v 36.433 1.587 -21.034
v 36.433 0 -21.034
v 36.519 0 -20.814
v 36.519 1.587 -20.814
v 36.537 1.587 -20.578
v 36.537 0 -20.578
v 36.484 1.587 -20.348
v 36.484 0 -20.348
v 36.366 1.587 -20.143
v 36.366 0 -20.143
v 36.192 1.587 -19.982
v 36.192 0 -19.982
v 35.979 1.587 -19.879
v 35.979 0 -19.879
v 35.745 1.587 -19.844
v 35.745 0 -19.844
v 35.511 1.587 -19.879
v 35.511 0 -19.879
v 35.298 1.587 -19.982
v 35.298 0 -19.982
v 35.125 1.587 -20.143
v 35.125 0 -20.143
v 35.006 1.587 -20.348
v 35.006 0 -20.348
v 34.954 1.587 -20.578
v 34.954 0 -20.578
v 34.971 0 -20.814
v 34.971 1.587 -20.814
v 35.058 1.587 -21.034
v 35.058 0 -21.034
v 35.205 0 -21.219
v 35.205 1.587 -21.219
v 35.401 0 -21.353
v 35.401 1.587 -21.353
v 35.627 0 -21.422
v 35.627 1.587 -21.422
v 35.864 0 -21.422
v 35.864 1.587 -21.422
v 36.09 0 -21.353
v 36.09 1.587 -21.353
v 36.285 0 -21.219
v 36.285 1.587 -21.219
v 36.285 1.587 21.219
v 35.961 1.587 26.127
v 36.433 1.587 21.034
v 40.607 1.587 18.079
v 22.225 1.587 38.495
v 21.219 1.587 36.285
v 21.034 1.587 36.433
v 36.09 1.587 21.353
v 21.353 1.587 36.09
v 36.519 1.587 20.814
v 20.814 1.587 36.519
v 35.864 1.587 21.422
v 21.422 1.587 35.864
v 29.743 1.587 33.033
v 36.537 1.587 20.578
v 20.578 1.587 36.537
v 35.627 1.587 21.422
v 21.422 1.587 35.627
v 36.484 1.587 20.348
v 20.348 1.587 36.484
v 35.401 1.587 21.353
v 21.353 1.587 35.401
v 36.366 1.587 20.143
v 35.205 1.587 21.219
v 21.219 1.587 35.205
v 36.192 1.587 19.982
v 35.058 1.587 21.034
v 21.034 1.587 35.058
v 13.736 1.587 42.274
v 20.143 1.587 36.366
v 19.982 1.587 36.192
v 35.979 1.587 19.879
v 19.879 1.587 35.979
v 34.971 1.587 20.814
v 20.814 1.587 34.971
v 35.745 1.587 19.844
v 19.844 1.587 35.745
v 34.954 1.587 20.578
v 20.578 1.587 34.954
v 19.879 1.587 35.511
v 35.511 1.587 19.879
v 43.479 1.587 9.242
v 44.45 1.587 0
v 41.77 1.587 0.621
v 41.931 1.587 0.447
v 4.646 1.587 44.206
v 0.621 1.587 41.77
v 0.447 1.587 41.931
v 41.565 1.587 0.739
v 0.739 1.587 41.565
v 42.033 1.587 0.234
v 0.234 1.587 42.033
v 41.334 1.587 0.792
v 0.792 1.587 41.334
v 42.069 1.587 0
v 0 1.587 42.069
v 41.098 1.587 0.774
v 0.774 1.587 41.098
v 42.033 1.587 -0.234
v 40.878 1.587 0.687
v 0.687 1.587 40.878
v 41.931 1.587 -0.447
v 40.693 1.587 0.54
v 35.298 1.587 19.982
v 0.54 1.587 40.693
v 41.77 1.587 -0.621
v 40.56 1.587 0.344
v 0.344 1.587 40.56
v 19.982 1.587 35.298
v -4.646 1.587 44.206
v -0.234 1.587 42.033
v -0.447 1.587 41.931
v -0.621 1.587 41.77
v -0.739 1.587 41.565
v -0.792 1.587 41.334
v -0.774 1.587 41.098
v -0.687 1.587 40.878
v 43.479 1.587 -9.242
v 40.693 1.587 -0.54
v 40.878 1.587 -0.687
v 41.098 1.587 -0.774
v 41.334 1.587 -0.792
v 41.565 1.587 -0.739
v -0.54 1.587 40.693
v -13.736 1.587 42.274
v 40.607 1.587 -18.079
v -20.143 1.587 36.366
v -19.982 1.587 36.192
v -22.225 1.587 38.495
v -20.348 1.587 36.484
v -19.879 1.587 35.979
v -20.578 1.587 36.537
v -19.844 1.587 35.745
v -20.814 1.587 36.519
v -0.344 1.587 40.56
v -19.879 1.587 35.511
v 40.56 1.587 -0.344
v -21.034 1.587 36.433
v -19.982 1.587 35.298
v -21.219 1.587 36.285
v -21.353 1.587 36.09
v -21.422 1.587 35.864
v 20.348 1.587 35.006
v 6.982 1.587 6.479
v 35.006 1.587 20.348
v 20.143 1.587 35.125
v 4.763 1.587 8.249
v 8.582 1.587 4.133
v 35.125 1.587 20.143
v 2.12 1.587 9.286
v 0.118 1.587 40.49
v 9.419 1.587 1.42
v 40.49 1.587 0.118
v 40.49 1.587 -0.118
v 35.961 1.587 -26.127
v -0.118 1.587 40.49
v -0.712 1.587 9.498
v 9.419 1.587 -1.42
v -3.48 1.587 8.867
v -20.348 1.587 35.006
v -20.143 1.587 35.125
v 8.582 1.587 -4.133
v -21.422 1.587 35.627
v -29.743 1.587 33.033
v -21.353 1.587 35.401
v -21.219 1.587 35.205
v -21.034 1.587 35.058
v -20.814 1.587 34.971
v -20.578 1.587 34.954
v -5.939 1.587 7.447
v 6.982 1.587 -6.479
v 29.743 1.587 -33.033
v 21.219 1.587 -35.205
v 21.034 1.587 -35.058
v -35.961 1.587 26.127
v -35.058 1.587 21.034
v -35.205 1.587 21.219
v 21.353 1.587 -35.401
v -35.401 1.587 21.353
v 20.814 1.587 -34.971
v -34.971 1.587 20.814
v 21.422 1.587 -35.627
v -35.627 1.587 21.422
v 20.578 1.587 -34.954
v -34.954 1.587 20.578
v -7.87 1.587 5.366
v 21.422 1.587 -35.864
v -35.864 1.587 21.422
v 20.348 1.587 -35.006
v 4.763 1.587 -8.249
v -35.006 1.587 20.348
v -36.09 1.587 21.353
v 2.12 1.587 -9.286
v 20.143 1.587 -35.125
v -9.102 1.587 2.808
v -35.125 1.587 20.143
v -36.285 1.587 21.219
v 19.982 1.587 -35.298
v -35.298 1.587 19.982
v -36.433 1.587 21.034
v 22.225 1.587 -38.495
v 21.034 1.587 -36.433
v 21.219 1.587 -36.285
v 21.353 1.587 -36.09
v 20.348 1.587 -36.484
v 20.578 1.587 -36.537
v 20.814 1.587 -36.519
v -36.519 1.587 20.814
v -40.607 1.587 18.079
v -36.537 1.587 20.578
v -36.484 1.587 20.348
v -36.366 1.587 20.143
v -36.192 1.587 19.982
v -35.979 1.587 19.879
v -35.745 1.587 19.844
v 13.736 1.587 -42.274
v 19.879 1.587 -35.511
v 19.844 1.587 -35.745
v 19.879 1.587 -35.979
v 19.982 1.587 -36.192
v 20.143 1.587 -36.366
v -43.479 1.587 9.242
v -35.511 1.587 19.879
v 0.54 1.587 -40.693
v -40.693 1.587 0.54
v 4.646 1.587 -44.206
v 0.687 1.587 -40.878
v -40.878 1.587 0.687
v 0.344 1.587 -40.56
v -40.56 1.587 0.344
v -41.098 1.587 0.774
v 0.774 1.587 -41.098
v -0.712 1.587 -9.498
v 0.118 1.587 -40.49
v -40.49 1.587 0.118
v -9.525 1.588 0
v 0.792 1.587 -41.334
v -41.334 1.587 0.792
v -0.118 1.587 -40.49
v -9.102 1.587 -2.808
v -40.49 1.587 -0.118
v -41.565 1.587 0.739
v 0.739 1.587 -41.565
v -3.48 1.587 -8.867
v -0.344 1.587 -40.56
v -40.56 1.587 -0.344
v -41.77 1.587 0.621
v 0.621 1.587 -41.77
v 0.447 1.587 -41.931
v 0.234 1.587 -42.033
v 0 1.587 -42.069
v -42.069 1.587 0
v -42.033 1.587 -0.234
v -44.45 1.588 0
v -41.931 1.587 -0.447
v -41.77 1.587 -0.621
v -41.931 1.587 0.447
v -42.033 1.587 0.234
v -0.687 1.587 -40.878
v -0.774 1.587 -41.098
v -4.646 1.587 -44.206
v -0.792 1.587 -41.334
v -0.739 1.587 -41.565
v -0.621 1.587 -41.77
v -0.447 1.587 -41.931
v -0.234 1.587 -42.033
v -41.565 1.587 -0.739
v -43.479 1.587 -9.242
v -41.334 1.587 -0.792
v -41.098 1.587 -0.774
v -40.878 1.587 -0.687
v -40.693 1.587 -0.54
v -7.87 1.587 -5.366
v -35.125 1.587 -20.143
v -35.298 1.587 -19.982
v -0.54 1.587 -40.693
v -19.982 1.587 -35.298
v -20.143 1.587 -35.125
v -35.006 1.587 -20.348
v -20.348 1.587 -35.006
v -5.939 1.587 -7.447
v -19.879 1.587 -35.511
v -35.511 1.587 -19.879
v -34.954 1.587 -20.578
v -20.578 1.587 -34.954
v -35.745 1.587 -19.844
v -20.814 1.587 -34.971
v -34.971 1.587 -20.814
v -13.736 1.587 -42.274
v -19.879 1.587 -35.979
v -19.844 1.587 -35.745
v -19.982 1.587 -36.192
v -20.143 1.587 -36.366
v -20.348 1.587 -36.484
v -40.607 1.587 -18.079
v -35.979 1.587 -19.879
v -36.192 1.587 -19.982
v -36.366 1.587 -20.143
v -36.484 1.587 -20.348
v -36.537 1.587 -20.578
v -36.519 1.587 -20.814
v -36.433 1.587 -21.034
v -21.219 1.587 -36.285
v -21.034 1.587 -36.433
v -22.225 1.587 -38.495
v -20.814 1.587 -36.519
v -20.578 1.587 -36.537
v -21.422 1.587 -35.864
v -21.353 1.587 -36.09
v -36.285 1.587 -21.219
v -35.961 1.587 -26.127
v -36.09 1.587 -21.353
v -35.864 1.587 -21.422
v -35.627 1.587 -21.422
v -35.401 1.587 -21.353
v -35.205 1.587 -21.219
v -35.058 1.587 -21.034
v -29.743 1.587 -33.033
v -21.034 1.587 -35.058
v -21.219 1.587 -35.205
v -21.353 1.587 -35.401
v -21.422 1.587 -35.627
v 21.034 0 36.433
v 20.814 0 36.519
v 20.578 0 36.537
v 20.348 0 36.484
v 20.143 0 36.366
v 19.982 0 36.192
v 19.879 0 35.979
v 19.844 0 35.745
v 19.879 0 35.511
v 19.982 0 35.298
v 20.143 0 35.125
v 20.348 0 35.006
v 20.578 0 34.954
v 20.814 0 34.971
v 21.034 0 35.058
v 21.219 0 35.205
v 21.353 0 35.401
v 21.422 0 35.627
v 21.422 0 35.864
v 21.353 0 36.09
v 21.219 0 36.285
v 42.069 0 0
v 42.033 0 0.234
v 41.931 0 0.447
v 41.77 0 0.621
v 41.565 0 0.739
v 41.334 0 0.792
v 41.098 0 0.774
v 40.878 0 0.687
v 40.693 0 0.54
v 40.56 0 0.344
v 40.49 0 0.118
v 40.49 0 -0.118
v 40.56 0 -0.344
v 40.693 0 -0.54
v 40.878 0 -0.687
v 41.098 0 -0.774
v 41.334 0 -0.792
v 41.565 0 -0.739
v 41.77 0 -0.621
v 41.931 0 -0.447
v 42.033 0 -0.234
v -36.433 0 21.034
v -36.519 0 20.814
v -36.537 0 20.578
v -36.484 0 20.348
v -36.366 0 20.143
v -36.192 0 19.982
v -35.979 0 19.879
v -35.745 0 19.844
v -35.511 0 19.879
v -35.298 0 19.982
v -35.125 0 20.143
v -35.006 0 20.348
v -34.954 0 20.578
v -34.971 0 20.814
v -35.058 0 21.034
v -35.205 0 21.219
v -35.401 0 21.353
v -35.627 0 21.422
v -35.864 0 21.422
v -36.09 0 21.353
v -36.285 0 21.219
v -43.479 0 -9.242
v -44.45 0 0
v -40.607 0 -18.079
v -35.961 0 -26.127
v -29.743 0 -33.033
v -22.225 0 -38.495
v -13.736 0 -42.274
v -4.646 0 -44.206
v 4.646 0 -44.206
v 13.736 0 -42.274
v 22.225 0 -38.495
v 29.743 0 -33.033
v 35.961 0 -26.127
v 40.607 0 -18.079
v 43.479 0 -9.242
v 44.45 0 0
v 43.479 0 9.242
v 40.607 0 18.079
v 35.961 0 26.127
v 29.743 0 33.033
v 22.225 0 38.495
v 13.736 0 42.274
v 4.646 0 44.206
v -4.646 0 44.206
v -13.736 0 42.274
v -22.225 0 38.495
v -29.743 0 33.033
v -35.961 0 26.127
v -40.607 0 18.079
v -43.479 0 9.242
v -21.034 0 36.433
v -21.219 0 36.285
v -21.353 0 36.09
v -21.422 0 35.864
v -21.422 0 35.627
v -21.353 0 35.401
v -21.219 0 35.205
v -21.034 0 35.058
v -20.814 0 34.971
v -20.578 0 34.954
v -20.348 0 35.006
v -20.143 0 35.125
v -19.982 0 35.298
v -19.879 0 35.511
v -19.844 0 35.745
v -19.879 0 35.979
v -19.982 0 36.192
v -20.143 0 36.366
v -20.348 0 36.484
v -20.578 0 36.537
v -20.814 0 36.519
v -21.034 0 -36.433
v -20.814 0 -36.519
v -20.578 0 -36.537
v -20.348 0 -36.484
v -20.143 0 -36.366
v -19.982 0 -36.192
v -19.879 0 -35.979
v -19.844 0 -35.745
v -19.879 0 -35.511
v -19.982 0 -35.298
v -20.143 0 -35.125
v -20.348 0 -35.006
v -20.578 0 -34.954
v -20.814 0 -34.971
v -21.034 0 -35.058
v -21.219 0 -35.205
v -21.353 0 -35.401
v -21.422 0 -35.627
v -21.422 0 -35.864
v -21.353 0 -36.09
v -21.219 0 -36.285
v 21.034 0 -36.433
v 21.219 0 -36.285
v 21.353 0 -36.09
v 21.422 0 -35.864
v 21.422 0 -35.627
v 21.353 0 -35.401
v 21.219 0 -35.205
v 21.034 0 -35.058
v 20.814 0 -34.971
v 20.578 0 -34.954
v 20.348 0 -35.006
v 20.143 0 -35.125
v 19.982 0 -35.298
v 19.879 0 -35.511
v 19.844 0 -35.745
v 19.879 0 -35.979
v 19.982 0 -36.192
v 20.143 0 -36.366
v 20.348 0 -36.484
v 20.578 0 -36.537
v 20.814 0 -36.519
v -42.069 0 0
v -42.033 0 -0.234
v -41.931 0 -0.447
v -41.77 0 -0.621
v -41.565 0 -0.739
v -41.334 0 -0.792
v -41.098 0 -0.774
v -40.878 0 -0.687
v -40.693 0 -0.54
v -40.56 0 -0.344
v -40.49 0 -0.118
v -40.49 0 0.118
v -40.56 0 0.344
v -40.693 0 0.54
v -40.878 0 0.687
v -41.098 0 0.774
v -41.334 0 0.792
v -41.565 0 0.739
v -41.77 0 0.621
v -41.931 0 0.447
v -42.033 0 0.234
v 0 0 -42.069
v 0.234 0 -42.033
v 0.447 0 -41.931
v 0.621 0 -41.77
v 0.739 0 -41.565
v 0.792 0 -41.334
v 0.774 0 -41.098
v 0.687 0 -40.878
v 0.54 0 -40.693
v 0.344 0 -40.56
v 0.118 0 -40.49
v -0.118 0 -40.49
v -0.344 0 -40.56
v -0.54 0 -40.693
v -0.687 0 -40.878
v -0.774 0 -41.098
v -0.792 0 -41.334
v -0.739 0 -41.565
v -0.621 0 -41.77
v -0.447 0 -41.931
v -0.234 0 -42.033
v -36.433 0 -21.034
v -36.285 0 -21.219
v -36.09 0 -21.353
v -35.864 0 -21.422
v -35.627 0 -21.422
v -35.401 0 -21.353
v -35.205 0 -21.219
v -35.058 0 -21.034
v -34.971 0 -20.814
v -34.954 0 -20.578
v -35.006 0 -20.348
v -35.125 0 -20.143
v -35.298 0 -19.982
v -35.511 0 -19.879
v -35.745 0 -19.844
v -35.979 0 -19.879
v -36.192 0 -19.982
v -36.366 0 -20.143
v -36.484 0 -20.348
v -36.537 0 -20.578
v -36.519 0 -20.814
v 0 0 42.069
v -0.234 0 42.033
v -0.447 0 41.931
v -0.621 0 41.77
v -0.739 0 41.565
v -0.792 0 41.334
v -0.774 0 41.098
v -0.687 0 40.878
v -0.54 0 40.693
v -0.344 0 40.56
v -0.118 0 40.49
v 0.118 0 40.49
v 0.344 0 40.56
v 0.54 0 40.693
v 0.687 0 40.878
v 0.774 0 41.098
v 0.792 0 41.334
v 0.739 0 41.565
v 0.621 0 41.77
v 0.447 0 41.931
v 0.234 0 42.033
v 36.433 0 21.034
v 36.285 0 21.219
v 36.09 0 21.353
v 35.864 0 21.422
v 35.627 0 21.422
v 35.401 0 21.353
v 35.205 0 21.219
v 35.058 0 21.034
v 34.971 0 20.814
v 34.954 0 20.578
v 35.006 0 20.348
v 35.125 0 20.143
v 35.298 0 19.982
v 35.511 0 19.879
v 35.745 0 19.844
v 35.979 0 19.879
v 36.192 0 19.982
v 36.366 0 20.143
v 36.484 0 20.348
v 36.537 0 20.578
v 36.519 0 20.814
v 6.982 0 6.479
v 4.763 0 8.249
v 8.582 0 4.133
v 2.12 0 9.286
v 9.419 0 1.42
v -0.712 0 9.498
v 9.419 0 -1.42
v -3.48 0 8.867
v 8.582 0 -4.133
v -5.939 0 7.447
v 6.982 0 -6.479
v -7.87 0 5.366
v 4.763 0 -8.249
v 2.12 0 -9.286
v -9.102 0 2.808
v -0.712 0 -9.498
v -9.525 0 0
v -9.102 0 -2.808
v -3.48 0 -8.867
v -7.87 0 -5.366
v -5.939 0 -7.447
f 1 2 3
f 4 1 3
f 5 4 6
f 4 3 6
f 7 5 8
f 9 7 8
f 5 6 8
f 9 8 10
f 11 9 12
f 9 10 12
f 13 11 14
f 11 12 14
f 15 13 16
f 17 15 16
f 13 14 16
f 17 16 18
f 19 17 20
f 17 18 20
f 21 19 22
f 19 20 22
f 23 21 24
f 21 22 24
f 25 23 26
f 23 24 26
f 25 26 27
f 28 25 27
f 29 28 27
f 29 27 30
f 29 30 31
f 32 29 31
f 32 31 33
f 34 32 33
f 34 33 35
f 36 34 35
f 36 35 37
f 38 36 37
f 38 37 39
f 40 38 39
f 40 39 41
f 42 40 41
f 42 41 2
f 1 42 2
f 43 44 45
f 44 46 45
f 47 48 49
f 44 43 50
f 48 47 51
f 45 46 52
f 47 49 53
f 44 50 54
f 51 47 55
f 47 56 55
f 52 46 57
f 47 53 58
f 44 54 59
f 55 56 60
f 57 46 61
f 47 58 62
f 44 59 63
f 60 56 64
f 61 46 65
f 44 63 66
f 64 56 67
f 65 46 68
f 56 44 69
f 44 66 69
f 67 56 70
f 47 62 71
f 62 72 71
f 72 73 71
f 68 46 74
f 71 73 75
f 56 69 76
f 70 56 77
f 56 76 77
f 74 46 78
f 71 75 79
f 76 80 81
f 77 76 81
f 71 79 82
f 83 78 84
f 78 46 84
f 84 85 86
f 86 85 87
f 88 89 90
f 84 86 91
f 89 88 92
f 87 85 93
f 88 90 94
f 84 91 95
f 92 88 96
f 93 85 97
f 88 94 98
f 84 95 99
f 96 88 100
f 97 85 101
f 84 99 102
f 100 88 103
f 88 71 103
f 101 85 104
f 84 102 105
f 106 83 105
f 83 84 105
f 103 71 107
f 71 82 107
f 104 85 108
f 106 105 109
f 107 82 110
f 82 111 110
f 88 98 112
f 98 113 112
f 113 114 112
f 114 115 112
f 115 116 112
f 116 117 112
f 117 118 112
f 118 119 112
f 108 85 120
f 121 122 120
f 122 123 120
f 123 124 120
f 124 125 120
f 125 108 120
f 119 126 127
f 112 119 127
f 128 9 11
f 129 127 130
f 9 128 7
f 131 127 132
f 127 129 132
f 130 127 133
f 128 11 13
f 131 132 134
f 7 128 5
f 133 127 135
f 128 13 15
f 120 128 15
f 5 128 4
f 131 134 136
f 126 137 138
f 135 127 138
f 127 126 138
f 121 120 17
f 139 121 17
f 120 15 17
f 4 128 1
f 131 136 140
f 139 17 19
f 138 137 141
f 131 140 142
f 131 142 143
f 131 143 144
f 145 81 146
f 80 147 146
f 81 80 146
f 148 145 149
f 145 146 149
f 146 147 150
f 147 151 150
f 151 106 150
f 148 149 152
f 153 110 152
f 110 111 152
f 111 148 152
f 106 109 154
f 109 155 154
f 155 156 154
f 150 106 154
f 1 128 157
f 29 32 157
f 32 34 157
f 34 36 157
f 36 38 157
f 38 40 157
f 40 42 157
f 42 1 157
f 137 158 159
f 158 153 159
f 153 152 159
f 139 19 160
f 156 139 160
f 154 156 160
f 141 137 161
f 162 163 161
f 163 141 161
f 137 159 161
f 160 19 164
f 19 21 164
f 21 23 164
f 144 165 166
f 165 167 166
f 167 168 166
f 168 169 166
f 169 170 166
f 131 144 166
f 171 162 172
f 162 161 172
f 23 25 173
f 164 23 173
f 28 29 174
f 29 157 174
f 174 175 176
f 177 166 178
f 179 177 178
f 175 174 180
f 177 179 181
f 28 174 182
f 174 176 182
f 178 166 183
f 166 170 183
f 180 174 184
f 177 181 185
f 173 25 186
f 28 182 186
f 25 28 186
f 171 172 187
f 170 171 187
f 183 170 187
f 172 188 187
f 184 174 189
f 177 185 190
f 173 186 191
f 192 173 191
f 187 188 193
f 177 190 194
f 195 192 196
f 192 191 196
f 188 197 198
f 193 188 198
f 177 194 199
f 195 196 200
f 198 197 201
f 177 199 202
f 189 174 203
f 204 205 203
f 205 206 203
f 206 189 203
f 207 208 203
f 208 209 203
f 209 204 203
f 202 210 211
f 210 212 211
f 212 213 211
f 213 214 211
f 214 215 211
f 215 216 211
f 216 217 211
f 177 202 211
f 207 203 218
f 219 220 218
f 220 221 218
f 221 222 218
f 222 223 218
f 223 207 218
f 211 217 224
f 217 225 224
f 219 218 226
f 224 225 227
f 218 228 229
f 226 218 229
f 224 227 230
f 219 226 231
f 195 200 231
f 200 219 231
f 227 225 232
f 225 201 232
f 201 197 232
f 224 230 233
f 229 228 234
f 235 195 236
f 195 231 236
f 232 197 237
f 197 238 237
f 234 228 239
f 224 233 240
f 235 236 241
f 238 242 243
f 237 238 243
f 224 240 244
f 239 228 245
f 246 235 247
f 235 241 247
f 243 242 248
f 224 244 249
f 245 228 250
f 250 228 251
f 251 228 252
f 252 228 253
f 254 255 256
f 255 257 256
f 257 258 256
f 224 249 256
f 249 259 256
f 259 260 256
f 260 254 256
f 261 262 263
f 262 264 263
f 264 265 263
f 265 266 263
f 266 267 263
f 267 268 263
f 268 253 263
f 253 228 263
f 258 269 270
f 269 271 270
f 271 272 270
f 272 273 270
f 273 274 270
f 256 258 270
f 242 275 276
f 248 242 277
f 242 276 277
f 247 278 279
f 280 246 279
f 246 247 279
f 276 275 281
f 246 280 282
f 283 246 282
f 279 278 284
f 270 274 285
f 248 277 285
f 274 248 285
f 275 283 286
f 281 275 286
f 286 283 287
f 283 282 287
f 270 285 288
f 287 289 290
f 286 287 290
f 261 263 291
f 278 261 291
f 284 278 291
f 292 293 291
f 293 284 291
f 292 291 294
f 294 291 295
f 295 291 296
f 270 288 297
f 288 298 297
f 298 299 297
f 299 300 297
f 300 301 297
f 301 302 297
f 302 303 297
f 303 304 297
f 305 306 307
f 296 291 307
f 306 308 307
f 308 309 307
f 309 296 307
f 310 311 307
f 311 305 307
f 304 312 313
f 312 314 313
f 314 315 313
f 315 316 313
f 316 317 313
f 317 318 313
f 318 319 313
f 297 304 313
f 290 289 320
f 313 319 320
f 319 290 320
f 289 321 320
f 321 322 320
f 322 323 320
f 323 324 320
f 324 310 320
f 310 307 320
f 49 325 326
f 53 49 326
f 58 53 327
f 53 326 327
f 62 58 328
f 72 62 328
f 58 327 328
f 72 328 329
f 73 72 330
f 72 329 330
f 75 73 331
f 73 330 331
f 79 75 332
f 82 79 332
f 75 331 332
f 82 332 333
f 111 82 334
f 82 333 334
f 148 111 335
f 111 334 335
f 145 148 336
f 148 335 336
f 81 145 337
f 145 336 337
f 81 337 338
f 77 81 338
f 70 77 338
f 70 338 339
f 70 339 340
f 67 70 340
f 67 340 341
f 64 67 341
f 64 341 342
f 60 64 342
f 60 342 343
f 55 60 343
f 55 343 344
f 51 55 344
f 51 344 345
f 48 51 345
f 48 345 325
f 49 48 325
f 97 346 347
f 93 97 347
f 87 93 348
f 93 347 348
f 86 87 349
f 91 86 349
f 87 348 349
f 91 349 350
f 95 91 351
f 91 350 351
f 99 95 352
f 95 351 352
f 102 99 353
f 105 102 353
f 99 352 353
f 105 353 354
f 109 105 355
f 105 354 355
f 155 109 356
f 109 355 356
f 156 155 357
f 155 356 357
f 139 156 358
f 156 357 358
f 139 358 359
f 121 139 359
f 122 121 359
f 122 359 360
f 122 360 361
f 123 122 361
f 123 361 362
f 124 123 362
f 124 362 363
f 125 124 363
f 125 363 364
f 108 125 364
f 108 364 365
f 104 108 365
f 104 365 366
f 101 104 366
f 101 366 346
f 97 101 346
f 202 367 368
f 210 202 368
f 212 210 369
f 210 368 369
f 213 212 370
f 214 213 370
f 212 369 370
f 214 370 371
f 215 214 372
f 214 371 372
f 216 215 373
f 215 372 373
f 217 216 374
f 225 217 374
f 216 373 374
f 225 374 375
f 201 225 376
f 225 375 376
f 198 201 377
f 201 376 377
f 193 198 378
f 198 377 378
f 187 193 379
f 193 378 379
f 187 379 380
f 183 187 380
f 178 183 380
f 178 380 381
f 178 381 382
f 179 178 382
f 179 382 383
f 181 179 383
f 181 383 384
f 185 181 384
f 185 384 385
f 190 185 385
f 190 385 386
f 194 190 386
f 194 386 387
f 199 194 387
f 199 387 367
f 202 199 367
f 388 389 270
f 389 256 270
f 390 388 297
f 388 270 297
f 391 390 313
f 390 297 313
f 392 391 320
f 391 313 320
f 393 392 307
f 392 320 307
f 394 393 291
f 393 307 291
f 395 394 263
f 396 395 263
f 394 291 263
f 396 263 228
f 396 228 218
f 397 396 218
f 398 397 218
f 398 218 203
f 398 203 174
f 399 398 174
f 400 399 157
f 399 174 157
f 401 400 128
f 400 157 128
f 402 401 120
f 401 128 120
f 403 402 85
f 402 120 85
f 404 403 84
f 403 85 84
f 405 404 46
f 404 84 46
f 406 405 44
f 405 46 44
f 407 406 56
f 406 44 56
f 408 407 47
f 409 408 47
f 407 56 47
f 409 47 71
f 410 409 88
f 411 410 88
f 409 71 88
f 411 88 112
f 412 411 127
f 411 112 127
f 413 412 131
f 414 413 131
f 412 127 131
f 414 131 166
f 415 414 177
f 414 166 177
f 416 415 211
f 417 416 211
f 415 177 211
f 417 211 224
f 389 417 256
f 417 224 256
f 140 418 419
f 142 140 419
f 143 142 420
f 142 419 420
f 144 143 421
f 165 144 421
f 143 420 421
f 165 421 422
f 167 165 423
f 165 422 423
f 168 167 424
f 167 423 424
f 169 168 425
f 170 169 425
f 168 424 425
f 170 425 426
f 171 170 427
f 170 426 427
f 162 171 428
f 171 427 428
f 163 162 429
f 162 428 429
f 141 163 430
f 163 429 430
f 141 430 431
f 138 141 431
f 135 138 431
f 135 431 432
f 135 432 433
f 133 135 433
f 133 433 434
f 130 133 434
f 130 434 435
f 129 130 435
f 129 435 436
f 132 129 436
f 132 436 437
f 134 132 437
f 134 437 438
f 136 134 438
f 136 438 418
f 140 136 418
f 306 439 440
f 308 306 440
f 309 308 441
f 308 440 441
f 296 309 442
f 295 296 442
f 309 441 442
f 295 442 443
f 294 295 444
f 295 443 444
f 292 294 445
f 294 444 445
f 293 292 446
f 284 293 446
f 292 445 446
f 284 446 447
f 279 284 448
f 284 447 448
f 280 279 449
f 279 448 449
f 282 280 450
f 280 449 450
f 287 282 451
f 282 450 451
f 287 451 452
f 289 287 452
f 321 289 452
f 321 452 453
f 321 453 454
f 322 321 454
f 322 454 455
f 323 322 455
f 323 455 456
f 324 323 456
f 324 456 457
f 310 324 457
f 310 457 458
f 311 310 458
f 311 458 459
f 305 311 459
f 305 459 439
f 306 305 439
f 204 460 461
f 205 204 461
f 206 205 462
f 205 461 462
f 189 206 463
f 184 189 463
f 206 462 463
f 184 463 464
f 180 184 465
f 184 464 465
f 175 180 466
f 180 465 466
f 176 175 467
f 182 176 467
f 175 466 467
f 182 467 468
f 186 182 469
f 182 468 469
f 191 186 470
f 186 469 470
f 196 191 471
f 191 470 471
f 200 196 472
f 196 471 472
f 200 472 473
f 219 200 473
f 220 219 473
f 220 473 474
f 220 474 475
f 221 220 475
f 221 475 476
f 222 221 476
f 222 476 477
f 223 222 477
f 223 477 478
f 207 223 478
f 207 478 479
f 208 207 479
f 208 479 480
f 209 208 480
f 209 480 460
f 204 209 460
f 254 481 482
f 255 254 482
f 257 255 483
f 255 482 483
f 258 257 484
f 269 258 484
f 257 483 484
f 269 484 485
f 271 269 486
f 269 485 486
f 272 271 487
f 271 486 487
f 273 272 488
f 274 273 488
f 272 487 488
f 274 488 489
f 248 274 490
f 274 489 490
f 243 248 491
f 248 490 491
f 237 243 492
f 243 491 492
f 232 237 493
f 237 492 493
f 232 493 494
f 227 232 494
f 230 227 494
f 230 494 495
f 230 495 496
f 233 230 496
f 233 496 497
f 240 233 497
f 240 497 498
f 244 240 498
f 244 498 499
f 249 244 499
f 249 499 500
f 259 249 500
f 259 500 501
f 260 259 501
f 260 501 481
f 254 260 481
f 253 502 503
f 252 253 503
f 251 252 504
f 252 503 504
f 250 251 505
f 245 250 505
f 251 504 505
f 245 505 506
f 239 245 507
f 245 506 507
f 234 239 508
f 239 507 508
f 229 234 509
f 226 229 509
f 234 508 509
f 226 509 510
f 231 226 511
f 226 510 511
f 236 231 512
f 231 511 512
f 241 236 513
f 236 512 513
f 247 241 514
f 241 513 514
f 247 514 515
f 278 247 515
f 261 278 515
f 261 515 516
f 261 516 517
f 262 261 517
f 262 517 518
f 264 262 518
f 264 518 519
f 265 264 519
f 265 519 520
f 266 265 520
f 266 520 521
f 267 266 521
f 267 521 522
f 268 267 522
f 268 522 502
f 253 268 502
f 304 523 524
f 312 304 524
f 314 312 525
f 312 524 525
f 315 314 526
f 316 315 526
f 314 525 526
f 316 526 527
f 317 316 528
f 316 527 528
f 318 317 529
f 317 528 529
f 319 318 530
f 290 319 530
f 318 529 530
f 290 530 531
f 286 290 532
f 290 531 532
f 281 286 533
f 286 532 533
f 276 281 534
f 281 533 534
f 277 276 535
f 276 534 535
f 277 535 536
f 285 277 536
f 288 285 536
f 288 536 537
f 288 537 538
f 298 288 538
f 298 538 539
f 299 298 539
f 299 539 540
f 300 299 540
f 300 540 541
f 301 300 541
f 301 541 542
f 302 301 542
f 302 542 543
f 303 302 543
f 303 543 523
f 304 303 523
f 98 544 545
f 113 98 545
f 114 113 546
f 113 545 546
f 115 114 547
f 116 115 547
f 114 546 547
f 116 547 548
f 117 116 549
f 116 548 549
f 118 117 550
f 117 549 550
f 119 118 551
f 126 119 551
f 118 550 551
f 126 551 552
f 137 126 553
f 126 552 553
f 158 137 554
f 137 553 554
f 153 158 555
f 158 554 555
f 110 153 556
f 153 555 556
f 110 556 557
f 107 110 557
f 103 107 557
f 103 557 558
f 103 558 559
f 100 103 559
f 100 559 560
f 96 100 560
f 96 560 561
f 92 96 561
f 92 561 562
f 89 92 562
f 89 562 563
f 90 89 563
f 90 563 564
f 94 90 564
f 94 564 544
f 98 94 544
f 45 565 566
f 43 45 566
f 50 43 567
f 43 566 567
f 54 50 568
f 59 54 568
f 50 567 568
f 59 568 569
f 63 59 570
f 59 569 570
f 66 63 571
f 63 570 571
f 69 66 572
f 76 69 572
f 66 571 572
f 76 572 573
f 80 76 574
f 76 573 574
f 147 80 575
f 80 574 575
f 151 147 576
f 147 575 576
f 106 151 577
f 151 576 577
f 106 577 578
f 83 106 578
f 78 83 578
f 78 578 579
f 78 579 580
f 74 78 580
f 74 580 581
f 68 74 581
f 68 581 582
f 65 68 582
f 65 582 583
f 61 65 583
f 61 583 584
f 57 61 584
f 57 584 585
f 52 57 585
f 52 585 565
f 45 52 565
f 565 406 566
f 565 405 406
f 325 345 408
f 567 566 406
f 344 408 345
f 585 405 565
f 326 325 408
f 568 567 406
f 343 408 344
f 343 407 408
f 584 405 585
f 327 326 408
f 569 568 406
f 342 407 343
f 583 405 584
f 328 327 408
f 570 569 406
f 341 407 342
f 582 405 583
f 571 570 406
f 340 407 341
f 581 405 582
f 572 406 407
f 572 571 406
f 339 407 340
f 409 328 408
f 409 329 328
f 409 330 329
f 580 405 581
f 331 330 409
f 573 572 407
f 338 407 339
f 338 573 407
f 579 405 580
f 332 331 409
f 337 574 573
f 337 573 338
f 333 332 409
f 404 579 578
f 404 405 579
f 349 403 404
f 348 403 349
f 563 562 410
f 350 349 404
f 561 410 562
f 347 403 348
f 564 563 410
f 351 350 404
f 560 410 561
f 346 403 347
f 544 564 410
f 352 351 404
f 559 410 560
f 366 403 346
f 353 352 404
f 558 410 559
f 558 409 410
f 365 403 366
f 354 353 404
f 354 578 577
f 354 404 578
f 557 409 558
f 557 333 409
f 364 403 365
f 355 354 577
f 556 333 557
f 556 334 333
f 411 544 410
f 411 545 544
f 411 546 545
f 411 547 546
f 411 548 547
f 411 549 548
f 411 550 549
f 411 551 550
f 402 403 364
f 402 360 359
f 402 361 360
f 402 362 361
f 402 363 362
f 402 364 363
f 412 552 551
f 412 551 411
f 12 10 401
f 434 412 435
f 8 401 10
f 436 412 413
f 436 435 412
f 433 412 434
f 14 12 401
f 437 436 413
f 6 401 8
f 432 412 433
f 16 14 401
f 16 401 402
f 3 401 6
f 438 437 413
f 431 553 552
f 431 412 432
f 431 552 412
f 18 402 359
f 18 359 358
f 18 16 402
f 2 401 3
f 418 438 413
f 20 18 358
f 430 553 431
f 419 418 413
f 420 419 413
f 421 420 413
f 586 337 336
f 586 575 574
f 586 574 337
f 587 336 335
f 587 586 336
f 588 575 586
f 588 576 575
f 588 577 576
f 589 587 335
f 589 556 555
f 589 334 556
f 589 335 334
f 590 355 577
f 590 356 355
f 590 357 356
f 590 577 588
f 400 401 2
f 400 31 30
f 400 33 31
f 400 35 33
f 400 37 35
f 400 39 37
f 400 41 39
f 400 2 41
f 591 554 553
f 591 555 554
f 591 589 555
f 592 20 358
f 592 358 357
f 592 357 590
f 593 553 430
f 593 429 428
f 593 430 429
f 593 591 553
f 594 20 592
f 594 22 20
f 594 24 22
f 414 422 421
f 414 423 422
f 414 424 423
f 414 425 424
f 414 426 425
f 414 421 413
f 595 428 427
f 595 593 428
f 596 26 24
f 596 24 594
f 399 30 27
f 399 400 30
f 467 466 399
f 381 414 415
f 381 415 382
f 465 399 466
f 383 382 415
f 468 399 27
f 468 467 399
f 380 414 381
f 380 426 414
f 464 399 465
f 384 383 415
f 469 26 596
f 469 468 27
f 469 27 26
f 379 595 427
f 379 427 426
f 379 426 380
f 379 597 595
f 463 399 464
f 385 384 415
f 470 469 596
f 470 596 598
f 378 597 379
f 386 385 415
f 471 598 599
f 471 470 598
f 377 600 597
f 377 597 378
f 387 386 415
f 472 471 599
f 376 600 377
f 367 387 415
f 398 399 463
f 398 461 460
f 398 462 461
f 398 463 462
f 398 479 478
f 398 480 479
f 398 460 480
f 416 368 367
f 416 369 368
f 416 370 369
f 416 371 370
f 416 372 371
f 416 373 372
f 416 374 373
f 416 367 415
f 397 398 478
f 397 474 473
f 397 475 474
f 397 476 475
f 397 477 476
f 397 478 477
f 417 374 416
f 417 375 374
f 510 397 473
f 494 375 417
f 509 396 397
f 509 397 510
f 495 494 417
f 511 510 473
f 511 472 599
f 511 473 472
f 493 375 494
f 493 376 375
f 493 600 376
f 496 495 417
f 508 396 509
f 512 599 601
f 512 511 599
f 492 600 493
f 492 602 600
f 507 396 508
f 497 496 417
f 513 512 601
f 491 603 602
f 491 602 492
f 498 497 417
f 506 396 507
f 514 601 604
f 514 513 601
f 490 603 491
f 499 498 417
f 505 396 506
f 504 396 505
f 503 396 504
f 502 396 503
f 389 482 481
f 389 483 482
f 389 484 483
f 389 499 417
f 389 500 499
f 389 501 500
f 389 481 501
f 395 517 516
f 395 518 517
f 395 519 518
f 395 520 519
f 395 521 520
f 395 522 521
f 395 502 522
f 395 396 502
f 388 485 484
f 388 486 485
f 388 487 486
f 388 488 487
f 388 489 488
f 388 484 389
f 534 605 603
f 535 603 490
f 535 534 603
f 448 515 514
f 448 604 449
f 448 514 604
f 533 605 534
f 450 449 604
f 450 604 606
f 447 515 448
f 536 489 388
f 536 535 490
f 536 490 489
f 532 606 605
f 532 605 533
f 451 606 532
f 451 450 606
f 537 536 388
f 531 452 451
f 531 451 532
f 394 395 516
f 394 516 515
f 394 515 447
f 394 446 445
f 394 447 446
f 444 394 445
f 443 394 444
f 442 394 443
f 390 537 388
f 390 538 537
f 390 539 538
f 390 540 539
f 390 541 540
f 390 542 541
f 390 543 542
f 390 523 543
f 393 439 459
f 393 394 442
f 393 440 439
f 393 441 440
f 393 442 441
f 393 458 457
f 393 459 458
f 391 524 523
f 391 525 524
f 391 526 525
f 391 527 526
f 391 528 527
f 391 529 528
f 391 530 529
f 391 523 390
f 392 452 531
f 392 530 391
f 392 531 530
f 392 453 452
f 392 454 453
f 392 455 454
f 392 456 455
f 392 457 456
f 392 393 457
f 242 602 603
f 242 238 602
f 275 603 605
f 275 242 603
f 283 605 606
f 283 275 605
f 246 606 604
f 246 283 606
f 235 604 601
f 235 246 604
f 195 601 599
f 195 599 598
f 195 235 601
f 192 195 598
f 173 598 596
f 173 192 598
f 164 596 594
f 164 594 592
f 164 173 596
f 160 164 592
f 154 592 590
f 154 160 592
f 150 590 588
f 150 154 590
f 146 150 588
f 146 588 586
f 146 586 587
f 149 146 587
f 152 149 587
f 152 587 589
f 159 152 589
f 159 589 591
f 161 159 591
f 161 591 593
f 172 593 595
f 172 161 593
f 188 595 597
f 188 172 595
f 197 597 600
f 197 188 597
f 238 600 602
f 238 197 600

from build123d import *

# Parameters (mm, degrees)
SKETCH1_W                      = 34.925
SKETCH1_H                      = 1.5875
F_1_16_0_0625_DIAMETER_HOLE1_D = 1.5875
CIRPATTERN1_COUNT              = 12


with BuildPart() as part:
    # Sketch1 → Revolve1 (revolve)
    with BuildSketch(Plane.XY):
        with Locations((-26.9875, 0.79375)):
            Rectangle(SKETCH1_W, SKETCH1_H)
    revolve(axis=Axis((0, 55, 0), (0, -1, 0)))

    # 1/16 (0.0625) Diameter Hole1 (through all)
    with Locations(Plane(origin=(0, 1.5875, 0), x_dir=(1, 0, 0), z_dir=(0, 1, 0))):
        with Locations((-41.275, 0)):
            f_1_16_0_0625_diameter_hole1 = Hole(F_1_16_0_0625_DIAMETER_HOLE1_D / 2)

    # CirPattern1: 1/16 (0.0625) Diameter Hole1 ×12 about axis
    cirpattern1_axis = Axis((0, 0, 0), (0, 1, 0))
    for i in range(1, CIRPATTERN1_COUNT):
        add(f_1_16_0_0625_diameter_hole1.rotate(cirpattern1_axis, i * 360 / CIRPATTERN1_COUNT), mode=Mode.SUBTRACT)


solid = part.part
